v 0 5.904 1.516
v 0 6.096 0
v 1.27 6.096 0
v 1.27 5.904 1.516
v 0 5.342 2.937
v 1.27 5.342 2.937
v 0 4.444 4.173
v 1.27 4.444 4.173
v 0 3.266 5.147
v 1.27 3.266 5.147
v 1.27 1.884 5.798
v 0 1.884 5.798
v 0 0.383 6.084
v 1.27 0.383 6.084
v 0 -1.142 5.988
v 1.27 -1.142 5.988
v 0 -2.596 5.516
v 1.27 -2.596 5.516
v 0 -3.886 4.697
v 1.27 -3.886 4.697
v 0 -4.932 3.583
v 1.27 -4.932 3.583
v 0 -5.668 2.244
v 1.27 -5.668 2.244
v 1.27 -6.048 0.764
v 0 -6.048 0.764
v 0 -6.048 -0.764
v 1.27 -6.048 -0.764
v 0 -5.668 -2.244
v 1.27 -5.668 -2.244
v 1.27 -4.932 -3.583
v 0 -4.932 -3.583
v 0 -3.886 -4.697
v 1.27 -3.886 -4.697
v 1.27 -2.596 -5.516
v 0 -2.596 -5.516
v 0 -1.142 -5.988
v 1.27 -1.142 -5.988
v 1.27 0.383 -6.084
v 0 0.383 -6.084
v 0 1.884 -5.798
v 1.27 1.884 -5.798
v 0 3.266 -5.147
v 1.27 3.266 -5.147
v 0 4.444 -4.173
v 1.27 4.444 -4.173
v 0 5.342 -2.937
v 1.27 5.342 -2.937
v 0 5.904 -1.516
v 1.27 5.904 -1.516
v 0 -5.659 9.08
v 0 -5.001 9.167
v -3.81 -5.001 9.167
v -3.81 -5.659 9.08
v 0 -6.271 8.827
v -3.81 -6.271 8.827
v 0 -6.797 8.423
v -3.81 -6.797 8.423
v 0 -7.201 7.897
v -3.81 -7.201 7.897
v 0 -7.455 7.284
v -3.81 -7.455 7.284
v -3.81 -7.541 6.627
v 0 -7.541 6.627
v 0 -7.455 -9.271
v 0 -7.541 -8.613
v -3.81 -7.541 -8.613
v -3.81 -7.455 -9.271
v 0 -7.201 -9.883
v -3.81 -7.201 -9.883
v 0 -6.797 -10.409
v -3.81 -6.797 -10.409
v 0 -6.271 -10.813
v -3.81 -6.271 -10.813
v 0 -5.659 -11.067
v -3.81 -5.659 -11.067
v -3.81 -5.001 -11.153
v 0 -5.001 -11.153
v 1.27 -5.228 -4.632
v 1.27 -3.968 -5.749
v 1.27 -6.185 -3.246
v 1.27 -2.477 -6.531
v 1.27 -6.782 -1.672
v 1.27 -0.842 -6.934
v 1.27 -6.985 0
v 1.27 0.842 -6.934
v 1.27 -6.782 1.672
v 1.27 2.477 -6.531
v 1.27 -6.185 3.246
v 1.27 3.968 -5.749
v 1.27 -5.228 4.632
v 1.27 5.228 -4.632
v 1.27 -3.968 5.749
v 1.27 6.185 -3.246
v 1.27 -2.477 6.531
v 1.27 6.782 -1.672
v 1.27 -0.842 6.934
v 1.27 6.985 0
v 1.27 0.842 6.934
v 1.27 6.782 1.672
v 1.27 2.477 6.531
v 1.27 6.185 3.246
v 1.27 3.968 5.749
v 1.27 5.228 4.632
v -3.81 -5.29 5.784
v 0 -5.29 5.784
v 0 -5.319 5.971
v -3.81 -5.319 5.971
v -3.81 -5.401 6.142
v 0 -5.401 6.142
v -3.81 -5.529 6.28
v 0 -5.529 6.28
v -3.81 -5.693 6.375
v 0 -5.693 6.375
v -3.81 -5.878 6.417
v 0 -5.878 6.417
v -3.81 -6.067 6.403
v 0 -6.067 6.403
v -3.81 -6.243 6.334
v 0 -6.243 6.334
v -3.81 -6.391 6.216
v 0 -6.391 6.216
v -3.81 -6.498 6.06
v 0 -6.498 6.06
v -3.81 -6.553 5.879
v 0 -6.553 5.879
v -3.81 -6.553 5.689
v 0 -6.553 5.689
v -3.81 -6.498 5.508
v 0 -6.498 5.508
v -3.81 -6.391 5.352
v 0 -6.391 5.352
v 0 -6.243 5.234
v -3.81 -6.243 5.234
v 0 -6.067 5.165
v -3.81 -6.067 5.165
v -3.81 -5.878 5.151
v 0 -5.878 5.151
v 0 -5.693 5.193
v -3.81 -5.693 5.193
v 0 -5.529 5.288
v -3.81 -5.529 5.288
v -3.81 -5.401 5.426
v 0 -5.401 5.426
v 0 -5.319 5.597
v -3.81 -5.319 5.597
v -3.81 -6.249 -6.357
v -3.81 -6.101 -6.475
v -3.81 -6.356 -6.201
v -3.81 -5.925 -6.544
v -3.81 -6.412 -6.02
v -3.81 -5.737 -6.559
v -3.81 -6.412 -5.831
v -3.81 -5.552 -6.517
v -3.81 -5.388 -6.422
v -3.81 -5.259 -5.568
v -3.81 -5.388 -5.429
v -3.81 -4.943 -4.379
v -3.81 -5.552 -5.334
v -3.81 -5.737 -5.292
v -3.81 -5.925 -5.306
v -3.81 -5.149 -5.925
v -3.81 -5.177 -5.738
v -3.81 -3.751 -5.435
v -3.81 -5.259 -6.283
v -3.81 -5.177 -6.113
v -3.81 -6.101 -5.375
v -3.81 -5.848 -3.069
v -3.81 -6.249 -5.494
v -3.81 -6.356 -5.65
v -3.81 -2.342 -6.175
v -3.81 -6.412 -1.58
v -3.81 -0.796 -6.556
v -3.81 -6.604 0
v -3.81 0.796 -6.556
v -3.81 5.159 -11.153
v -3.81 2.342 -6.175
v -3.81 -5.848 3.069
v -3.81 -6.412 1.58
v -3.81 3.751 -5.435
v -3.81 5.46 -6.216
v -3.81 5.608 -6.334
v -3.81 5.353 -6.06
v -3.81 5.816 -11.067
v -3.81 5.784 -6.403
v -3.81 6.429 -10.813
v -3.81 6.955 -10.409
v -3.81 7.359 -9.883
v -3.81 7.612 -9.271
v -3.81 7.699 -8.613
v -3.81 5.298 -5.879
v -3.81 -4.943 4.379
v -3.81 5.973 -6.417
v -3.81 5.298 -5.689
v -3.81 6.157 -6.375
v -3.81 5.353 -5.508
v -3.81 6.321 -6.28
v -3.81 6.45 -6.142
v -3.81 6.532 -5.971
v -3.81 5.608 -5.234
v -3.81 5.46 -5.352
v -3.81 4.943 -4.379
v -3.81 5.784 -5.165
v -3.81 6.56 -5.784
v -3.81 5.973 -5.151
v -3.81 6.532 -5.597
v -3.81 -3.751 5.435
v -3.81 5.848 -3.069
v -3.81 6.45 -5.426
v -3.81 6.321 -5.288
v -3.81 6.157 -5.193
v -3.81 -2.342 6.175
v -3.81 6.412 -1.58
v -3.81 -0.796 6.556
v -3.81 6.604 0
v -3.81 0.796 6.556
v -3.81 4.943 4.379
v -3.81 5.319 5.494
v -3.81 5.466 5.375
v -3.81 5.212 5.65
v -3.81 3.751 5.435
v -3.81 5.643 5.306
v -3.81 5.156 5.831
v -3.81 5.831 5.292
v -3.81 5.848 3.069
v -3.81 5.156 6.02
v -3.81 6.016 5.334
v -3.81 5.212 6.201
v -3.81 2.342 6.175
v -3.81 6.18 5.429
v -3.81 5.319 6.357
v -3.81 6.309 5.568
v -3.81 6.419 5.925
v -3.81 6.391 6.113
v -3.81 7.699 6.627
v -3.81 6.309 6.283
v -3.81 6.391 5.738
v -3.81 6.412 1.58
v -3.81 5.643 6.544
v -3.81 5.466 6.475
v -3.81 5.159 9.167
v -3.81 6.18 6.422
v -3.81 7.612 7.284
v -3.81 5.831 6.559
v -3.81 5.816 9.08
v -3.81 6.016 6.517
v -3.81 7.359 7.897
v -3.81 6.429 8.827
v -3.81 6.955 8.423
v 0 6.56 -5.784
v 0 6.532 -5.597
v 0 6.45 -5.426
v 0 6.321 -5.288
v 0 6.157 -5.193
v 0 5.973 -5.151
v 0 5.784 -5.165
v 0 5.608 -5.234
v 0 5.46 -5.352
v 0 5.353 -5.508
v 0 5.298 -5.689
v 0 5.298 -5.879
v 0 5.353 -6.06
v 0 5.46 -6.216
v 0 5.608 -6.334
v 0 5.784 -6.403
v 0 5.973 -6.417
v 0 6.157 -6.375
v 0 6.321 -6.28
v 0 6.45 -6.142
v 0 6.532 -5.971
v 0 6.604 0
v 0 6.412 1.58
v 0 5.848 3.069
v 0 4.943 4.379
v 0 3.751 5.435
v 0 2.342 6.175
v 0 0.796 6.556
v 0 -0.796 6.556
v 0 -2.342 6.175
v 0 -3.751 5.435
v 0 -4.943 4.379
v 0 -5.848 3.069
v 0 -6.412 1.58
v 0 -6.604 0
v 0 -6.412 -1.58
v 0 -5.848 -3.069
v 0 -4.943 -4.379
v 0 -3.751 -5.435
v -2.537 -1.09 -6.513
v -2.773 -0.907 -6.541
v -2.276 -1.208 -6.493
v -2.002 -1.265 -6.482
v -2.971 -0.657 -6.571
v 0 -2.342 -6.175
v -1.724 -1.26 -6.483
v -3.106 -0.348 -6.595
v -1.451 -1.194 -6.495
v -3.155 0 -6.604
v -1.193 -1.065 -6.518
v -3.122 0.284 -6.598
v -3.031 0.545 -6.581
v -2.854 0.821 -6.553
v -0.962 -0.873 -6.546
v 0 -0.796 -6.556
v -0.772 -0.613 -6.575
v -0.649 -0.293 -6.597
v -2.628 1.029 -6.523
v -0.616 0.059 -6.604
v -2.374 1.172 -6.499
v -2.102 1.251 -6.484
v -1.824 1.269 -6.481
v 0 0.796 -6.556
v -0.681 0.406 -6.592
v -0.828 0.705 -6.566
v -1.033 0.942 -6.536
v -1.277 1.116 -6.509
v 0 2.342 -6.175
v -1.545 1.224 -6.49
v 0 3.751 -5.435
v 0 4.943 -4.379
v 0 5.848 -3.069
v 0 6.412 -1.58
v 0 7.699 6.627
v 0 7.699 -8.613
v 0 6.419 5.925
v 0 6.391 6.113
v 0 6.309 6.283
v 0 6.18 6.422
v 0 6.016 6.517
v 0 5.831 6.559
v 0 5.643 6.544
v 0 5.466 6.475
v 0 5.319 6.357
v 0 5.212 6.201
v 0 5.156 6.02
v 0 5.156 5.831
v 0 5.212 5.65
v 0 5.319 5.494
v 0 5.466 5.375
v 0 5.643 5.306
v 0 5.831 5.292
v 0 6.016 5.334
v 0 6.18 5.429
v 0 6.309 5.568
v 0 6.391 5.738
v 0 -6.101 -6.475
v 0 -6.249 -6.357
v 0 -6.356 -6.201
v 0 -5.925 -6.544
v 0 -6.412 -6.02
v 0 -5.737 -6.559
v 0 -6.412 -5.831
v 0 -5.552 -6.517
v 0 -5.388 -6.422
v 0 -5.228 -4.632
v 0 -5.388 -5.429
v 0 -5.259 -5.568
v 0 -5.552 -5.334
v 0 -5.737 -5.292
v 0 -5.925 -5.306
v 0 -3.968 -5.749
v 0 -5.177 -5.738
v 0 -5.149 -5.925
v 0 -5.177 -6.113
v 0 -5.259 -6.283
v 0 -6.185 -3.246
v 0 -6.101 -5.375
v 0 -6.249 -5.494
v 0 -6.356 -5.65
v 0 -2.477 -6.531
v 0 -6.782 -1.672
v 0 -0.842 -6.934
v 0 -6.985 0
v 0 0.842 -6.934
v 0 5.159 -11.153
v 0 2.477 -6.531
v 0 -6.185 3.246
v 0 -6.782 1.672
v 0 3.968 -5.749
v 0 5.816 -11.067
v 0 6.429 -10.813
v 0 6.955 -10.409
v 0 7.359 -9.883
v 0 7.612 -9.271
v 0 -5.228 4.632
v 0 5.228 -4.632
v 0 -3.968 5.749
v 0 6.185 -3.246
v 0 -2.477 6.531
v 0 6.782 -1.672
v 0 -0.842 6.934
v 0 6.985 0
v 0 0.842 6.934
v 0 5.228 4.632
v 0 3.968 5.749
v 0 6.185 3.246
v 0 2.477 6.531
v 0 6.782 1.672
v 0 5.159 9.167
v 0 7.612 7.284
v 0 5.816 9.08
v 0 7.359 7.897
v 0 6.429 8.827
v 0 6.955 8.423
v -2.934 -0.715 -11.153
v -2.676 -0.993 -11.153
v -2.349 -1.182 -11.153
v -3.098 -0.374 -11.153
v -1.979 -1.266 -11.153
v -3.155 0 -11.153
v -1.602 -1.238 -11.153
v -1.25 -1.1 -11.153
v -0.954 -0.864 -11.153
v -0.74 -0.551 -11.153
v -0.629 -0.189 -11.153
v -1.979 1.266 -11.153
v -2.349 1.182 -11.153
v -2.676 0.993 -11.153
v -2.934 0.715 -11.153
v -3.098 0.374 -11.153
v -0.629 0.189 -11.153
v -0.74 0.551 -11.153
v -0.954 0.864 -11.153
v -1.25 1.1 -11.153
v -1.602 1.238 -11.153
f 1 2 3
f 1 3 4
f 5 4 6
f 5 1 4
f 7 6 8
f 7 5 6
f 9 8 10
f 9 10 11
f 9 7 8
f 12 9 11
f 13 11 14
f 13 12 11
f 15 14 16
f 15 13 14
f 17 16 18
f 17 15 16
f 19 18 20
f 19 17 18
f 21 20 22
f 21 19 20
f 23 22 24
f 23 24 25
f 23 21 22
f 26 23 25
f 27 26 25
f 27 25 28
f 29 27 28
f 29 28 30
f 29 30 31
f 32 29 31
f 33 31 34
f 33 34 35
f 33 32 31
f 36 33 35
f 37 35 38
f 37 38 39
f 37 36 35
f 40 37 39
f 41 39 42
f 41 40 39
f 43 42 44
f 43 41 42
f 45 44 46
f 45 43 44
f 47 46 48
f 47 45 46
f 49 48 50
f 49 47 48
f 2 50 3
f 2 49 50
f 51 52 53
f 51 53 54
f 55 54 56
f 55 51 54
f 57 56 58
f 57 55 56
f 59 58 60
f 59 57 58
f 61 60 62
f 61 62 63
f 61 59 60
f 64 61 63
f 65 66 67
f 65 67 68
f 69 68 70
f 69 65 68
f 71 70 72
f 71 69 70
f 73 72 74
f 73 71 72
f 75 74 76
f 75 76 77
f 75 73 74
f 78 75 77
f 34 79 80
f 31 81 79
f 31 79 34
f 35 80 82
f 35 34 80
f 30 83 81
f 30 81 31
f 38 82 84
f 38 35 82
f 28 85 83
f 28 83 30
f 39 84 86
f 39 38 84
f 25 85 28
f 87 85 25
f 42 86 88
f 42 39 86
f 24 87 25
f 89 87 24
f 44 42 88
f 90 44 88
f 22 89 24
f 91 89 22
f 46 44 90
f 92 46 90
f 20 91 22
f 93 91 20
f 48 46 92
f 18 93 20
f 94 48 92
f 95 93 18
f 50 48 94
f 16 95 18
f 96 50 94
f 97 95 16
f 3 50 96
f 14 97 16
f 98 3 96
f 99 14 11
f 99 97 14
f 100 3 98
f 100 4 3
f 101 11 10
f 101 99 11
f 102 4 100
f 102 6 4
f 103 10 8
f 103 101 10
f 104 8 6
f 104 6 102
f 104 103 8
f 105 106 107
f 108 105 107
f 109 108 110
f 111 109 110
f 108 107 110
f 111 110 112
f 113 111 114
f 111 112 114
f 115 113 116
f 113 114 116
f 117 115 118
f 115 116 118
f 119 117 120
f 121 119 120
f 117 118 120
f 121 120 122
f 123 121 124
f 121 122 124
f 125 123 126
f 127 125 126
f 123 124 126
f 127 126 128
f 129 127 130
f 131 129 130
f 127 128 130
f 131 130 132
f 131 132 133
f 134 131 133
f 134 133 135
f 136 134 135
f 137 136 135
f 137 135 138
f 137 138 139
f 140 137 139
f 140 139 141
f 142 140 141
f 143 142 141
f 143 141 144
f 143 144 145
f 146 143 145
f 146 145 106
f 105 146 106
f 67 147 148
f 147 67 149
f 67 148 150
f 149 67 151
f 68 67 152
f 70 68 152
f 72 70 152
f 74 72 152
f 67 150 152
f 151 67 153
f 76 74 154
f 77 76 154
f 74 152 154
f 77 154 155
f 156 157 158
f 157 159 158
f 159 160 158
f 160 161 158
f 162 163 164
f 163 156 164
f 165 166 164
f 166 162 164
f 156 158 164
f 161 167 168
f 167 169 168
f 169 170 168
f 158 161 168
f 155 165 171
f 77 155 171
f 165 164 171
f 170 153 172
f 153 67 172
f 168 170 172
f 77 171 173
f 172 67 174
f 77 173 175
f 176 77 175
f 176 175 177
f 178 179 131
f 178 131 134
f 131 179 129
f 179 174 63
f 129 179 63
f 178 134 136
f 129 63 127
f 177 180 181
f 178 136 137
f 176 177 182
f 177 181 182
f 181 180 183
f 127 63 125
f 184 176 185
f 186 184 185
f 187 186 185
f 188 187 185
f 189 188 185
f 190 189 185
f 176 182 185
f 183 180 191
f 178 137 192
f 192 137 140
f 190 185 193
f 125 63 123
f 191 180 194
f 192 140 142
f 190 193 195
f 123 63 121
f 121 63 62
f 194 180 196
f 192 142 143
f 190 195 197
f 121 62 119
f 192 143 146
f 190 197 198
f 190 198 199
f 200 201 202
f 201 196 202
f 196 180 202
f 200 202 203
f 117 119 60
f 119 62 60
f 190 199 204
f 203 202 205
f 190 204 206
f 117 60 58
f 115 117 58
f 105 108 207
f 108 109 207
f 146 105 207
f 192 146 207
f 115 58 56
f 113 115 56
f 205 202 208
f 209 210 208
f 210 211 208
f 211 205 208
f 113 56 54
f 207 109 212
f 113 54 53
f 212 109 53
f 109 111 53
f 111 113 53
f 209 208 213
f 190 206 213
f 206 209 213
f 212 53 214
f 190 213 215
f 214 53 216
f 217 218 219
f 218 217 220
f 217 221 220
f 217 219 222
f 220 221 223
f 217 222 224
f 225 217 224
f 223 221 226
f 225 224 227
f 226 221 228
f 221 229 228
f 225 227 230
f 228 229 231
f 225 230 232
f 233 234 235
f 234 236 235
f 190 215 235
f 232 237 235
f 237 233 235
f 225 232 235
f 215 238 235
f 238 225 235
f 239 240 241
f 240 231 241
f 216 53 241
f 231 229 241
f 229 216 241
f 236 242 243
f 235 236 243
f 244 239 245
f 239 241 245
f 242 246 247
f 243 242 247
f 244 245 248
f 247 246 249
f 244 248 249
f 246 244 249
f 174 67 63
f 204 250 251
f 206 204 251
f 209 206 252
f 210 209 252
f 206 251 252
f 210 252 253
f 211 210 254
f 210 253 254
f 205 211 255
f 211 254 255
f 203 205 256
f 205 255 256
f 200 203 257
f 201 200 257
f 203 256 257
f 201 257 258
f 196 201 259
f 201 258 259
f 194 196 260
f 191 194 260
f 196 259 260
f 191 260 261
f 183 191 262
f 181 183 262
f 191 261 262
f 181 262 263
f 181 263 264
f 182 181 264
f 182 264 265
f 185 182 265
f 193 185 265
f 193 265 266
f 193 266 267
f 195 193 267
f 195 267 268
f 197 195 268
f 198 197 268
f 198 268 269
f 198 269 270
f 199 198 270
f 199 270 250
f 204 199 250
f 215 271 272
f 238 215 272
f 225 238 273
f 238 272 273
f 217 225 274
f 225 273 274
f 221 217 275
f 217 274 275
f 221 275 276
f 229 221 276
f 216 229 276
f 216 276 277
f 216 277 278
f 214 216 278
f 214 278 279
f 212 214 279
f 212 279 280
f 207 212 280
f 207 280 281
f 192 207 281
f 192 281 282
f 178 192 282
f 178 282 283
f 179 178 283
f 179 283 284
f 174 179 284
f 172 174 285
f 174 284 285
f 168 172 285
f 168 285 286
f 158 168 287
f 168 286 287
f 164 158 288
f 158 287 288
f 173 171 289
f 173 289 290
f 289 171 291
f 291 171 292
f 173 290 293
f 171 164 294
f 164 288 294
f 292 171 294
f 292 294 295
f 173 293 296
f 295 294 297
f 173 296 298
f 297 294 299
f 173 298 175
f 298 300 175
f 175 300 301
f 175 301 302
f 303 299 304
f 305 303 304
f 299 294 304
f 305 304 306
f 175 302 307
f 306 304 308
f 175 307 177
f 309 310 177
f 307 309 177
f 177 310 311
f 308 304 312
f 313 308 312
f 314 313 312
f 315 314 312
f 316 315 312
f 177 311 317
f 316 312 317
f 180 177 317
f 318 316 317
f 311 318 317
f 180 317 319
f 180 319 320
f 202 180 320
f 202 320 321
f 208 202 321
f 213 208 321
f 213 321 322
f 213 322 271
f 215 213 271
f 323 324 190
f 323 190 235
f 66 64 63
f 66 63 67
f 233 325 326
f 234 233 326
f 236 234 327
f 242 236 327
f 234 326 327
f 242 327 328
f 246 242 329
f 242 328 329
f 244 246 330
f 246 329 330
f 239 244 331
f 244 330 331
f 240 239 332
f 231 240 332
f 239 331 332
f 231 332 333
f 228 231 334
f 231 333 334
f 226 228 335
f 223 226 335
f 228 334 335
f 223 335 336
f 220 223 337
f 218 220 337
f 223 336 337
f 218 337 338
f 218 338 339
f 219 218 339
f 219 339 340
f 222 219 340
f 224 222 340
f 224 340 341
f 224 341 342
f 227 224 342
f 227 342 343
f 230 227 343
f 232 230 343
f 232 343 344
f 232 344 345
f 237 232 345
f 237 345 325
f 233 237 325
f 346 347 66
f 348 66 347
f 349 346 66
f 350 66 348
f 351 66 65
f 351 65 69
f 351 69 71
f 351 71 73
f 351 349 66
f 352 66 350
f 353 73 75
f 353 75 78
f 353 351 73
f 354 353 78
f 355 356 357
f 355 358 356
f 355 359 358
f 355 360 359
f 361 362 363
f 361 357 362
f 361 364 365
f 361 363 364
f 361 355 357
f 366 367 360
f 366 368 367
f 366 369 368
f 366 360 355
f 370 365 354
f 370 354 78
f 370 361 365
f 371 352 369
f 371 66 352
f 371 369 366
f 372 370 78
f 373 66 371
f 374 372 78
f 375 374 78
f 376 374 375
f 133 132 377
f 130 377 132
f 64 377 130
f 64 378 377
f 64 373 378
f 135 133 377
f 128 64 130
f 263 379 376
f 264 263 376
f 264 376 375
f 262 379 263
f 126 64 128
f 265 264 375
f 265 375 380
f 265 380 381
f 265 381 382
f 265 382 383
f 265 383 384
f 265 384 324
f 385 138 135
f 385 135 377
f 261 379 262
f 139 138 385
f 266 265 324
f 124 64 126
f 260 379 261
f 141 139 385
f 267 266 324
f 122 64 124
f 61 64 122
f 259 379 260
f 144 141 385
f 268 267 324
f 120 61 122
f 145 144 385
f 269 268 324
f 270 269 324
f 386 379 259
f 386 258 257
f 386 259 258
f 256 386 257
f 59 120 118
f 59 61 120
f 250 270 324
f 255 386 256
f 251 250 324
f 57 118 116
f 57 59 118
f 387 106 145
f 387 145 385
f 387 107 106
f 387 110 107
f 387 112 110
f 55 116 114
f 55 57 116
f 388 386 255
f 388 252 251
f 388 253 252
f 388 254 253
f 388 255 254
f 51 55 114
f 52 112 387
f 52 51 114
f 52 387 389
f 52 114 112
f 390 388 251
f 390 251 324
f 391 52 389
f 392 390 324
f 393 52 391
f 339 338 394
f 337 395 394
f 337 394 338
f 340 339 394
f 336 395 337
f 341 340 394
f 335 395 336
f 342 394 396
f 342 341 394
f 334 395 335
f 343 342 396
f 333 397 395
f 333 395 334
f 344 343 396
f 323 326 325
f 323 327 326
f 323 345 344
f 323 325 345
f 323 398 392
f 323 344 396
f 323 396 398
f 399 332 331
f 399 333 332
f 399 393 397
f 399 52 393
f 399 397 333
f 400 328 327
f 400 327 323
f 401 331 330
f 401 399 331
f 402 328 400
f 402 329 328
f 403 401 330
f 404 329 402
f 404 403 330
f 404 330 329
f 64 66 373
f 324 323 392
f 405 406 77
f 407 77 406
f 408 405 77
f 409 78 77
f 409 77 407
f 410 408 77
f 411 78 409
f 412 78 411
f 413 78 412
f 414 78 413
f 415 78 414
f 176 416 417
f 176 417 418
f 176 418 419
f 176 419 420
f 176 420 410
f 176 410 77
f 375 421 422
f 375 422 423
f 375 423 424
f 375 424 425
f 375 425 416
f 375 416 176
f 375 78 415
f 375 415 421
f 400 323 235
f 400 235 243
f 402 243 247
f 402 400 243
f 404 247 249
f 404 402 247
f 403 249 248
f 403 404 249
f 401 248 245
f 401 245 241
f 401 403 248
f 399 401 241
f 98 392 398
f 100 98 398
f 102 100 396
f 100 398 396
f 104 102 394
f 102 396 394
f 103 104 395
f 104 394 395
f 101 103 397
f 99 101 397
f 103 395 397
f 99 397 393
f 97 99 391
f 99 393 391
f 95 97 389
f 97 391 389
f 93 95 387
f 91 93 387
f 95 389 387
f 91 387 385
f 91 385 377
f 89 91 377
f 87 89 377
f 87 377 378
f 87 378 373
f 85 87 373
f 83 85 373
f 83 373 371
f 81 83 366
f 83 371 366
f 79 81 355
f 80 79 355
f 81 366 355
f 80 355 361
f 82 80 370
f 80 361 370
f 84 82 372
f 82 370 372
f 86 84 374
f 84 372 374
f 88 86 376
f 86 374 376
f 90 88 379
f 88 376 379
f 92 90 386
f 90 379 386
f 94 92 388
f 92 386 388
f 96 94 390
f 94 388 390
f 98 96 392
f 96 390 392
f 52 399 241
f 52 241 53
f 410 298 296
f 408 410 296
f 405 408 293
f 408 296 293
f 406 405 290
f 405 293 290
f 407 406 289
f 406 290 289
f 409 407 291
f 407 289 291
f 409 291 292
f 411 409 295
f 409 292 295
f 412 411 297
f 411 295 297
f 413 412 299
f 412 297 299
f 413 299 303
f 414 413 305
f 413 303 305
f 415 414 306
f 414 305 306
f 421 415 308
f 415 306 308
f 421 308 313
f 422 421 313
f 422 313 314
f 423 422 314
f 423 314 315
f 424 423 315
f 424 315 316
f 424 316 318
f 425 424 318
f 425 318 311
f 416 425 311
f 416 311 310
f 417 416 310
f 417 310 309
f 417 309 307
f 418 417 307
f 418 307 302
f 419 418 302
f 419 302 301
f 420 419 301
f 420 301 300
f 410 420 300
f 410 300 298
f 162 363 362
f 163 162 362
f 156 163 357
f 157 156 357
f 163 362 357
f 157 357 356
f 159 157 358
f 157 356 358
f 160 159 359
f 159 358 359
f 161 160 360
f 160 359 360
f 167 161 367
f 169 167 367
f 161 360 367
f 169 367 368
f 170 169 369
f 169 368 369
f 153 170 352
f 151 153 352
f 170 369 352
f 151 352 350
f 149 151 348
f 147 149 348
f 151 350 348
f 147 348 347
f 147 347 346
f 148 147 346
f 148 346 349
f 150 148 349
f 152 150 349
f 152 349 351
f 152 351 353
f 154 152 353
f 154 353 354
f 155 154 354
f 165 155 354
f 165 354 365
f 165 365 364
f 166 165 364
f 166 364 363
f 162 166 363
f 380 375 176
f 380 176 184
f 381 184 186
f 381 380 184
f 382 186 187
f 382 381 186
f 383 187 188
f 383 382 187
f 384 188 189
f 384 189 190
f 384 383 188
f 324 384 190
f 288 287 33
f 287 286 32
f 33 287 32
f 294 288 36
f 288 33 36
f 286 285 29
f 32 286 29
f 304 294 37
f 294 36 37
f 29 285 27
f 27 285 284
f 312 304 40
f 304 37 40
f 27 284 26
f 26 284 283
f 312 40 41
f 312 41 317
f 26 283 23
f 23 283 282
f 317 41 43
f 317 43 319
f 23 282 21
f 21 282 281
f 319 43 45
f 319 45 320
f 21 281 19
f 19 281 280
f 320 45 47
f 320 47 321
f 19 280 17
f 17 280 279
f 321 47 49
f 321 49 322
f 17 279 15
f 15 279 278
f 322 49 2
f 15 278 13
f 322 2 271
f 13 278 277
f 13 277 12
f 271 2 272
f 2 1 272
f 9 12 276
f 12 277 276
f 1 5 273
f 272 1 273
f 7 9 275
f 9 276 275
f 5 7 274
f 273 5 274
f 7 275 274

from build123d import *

# Parameters (mm, degrees)
F0_R     = 6.985
F0_R_2   = 6.096
F1_DEPTH = 1.27
F2_R     = 6.604
F3_DEPTH = 3.81
F5_D     = 1.27
F7_D     = 2.54
F7_DEPTH = 5.08
F7_TIP   = 0.7630929862


# Not quite as in the source:
# - a feature names something its author has since deleted; it is built from what else it names


with BuildPart() as f1:
    # F0 (on Right) → F1 (new body)
    with BuildSketch(Plane.YZ):
        Circle(F0_R)
        Circle(F0_R_2, mode=Mode.SUBTRACT)
    extrude(amount=F1_DEPTH)

    # F2 (on Right) → F3 (join)
    with BuildSketch(Plane.YZ):
        with BuildLine():
            Line((5.1588201895, 9.1668736476), (-5.0011798105, 9.1668736476))
            ThreePointArc((-5.0011798105, 9.1668736476), (-6.7972310347, 8.4229248718), (-7.5411798105, 6.6268736476))
            Line((-7.5411798105, 6.6268736476), (-7.5411798105, -8.6131263524))
            ThreePointArc((-7.5411798105, -8.6131263524), (-6.7972310347, -10.4091775766), (-5.0011798105, -11.1531263524))
            Line((-5.0011798105, -11.1531263524), (5.1588201895, -11.1531263524))
            ThreePointArc((5.1588201895, -11.1531263524), (6.9548714137, -10.4091775766), (7.6988201895, -8.6131263524))
            Line((7.6988201895, -8.6131263524), (7.6988201895, 6.6268736476))
            ThreePointArc((7.6988201895, 6.6268736476), (6.9548714137, 8.4229248718), (5.1588201895, 9.1668736476))
        make_face()
        Circle(F2_R, mode=Mode.SUBTRACT)
    extrude(amount=-F3_DEPTH)

    # F5 (through all)
    with Locations(Plane(origin=(-3.81, 0, 0), x_dir=(0, -1, 0), z_dir=(-1, 0, 0))):
        with Locations((5.9254106074, 5.7839893926), (-5.7839893926, 5.9254106074), (5.7839893926, -5.9254106074), (-5.9254106074, -5.7839893926)):
            Hole(F5_D / 2)

    # F7
    with Locations(Plane(origin=(0, 0, -11.1531263524), x_dir=(1, 0, 0), z_dir=(0, 0, -1))):
        with Locations((-1.8845667364, 0)):
            Hole(F7_D / 2, depth=F7_DEPTH)
            with Locations((0, 0, -(F7_DEPTH + F7_TIP / 2))):  # 118° drill point
                Cone(0, F7_D / 2, F7_TIP, mode=Mode.SUBTRACT)


solid = f1.part
